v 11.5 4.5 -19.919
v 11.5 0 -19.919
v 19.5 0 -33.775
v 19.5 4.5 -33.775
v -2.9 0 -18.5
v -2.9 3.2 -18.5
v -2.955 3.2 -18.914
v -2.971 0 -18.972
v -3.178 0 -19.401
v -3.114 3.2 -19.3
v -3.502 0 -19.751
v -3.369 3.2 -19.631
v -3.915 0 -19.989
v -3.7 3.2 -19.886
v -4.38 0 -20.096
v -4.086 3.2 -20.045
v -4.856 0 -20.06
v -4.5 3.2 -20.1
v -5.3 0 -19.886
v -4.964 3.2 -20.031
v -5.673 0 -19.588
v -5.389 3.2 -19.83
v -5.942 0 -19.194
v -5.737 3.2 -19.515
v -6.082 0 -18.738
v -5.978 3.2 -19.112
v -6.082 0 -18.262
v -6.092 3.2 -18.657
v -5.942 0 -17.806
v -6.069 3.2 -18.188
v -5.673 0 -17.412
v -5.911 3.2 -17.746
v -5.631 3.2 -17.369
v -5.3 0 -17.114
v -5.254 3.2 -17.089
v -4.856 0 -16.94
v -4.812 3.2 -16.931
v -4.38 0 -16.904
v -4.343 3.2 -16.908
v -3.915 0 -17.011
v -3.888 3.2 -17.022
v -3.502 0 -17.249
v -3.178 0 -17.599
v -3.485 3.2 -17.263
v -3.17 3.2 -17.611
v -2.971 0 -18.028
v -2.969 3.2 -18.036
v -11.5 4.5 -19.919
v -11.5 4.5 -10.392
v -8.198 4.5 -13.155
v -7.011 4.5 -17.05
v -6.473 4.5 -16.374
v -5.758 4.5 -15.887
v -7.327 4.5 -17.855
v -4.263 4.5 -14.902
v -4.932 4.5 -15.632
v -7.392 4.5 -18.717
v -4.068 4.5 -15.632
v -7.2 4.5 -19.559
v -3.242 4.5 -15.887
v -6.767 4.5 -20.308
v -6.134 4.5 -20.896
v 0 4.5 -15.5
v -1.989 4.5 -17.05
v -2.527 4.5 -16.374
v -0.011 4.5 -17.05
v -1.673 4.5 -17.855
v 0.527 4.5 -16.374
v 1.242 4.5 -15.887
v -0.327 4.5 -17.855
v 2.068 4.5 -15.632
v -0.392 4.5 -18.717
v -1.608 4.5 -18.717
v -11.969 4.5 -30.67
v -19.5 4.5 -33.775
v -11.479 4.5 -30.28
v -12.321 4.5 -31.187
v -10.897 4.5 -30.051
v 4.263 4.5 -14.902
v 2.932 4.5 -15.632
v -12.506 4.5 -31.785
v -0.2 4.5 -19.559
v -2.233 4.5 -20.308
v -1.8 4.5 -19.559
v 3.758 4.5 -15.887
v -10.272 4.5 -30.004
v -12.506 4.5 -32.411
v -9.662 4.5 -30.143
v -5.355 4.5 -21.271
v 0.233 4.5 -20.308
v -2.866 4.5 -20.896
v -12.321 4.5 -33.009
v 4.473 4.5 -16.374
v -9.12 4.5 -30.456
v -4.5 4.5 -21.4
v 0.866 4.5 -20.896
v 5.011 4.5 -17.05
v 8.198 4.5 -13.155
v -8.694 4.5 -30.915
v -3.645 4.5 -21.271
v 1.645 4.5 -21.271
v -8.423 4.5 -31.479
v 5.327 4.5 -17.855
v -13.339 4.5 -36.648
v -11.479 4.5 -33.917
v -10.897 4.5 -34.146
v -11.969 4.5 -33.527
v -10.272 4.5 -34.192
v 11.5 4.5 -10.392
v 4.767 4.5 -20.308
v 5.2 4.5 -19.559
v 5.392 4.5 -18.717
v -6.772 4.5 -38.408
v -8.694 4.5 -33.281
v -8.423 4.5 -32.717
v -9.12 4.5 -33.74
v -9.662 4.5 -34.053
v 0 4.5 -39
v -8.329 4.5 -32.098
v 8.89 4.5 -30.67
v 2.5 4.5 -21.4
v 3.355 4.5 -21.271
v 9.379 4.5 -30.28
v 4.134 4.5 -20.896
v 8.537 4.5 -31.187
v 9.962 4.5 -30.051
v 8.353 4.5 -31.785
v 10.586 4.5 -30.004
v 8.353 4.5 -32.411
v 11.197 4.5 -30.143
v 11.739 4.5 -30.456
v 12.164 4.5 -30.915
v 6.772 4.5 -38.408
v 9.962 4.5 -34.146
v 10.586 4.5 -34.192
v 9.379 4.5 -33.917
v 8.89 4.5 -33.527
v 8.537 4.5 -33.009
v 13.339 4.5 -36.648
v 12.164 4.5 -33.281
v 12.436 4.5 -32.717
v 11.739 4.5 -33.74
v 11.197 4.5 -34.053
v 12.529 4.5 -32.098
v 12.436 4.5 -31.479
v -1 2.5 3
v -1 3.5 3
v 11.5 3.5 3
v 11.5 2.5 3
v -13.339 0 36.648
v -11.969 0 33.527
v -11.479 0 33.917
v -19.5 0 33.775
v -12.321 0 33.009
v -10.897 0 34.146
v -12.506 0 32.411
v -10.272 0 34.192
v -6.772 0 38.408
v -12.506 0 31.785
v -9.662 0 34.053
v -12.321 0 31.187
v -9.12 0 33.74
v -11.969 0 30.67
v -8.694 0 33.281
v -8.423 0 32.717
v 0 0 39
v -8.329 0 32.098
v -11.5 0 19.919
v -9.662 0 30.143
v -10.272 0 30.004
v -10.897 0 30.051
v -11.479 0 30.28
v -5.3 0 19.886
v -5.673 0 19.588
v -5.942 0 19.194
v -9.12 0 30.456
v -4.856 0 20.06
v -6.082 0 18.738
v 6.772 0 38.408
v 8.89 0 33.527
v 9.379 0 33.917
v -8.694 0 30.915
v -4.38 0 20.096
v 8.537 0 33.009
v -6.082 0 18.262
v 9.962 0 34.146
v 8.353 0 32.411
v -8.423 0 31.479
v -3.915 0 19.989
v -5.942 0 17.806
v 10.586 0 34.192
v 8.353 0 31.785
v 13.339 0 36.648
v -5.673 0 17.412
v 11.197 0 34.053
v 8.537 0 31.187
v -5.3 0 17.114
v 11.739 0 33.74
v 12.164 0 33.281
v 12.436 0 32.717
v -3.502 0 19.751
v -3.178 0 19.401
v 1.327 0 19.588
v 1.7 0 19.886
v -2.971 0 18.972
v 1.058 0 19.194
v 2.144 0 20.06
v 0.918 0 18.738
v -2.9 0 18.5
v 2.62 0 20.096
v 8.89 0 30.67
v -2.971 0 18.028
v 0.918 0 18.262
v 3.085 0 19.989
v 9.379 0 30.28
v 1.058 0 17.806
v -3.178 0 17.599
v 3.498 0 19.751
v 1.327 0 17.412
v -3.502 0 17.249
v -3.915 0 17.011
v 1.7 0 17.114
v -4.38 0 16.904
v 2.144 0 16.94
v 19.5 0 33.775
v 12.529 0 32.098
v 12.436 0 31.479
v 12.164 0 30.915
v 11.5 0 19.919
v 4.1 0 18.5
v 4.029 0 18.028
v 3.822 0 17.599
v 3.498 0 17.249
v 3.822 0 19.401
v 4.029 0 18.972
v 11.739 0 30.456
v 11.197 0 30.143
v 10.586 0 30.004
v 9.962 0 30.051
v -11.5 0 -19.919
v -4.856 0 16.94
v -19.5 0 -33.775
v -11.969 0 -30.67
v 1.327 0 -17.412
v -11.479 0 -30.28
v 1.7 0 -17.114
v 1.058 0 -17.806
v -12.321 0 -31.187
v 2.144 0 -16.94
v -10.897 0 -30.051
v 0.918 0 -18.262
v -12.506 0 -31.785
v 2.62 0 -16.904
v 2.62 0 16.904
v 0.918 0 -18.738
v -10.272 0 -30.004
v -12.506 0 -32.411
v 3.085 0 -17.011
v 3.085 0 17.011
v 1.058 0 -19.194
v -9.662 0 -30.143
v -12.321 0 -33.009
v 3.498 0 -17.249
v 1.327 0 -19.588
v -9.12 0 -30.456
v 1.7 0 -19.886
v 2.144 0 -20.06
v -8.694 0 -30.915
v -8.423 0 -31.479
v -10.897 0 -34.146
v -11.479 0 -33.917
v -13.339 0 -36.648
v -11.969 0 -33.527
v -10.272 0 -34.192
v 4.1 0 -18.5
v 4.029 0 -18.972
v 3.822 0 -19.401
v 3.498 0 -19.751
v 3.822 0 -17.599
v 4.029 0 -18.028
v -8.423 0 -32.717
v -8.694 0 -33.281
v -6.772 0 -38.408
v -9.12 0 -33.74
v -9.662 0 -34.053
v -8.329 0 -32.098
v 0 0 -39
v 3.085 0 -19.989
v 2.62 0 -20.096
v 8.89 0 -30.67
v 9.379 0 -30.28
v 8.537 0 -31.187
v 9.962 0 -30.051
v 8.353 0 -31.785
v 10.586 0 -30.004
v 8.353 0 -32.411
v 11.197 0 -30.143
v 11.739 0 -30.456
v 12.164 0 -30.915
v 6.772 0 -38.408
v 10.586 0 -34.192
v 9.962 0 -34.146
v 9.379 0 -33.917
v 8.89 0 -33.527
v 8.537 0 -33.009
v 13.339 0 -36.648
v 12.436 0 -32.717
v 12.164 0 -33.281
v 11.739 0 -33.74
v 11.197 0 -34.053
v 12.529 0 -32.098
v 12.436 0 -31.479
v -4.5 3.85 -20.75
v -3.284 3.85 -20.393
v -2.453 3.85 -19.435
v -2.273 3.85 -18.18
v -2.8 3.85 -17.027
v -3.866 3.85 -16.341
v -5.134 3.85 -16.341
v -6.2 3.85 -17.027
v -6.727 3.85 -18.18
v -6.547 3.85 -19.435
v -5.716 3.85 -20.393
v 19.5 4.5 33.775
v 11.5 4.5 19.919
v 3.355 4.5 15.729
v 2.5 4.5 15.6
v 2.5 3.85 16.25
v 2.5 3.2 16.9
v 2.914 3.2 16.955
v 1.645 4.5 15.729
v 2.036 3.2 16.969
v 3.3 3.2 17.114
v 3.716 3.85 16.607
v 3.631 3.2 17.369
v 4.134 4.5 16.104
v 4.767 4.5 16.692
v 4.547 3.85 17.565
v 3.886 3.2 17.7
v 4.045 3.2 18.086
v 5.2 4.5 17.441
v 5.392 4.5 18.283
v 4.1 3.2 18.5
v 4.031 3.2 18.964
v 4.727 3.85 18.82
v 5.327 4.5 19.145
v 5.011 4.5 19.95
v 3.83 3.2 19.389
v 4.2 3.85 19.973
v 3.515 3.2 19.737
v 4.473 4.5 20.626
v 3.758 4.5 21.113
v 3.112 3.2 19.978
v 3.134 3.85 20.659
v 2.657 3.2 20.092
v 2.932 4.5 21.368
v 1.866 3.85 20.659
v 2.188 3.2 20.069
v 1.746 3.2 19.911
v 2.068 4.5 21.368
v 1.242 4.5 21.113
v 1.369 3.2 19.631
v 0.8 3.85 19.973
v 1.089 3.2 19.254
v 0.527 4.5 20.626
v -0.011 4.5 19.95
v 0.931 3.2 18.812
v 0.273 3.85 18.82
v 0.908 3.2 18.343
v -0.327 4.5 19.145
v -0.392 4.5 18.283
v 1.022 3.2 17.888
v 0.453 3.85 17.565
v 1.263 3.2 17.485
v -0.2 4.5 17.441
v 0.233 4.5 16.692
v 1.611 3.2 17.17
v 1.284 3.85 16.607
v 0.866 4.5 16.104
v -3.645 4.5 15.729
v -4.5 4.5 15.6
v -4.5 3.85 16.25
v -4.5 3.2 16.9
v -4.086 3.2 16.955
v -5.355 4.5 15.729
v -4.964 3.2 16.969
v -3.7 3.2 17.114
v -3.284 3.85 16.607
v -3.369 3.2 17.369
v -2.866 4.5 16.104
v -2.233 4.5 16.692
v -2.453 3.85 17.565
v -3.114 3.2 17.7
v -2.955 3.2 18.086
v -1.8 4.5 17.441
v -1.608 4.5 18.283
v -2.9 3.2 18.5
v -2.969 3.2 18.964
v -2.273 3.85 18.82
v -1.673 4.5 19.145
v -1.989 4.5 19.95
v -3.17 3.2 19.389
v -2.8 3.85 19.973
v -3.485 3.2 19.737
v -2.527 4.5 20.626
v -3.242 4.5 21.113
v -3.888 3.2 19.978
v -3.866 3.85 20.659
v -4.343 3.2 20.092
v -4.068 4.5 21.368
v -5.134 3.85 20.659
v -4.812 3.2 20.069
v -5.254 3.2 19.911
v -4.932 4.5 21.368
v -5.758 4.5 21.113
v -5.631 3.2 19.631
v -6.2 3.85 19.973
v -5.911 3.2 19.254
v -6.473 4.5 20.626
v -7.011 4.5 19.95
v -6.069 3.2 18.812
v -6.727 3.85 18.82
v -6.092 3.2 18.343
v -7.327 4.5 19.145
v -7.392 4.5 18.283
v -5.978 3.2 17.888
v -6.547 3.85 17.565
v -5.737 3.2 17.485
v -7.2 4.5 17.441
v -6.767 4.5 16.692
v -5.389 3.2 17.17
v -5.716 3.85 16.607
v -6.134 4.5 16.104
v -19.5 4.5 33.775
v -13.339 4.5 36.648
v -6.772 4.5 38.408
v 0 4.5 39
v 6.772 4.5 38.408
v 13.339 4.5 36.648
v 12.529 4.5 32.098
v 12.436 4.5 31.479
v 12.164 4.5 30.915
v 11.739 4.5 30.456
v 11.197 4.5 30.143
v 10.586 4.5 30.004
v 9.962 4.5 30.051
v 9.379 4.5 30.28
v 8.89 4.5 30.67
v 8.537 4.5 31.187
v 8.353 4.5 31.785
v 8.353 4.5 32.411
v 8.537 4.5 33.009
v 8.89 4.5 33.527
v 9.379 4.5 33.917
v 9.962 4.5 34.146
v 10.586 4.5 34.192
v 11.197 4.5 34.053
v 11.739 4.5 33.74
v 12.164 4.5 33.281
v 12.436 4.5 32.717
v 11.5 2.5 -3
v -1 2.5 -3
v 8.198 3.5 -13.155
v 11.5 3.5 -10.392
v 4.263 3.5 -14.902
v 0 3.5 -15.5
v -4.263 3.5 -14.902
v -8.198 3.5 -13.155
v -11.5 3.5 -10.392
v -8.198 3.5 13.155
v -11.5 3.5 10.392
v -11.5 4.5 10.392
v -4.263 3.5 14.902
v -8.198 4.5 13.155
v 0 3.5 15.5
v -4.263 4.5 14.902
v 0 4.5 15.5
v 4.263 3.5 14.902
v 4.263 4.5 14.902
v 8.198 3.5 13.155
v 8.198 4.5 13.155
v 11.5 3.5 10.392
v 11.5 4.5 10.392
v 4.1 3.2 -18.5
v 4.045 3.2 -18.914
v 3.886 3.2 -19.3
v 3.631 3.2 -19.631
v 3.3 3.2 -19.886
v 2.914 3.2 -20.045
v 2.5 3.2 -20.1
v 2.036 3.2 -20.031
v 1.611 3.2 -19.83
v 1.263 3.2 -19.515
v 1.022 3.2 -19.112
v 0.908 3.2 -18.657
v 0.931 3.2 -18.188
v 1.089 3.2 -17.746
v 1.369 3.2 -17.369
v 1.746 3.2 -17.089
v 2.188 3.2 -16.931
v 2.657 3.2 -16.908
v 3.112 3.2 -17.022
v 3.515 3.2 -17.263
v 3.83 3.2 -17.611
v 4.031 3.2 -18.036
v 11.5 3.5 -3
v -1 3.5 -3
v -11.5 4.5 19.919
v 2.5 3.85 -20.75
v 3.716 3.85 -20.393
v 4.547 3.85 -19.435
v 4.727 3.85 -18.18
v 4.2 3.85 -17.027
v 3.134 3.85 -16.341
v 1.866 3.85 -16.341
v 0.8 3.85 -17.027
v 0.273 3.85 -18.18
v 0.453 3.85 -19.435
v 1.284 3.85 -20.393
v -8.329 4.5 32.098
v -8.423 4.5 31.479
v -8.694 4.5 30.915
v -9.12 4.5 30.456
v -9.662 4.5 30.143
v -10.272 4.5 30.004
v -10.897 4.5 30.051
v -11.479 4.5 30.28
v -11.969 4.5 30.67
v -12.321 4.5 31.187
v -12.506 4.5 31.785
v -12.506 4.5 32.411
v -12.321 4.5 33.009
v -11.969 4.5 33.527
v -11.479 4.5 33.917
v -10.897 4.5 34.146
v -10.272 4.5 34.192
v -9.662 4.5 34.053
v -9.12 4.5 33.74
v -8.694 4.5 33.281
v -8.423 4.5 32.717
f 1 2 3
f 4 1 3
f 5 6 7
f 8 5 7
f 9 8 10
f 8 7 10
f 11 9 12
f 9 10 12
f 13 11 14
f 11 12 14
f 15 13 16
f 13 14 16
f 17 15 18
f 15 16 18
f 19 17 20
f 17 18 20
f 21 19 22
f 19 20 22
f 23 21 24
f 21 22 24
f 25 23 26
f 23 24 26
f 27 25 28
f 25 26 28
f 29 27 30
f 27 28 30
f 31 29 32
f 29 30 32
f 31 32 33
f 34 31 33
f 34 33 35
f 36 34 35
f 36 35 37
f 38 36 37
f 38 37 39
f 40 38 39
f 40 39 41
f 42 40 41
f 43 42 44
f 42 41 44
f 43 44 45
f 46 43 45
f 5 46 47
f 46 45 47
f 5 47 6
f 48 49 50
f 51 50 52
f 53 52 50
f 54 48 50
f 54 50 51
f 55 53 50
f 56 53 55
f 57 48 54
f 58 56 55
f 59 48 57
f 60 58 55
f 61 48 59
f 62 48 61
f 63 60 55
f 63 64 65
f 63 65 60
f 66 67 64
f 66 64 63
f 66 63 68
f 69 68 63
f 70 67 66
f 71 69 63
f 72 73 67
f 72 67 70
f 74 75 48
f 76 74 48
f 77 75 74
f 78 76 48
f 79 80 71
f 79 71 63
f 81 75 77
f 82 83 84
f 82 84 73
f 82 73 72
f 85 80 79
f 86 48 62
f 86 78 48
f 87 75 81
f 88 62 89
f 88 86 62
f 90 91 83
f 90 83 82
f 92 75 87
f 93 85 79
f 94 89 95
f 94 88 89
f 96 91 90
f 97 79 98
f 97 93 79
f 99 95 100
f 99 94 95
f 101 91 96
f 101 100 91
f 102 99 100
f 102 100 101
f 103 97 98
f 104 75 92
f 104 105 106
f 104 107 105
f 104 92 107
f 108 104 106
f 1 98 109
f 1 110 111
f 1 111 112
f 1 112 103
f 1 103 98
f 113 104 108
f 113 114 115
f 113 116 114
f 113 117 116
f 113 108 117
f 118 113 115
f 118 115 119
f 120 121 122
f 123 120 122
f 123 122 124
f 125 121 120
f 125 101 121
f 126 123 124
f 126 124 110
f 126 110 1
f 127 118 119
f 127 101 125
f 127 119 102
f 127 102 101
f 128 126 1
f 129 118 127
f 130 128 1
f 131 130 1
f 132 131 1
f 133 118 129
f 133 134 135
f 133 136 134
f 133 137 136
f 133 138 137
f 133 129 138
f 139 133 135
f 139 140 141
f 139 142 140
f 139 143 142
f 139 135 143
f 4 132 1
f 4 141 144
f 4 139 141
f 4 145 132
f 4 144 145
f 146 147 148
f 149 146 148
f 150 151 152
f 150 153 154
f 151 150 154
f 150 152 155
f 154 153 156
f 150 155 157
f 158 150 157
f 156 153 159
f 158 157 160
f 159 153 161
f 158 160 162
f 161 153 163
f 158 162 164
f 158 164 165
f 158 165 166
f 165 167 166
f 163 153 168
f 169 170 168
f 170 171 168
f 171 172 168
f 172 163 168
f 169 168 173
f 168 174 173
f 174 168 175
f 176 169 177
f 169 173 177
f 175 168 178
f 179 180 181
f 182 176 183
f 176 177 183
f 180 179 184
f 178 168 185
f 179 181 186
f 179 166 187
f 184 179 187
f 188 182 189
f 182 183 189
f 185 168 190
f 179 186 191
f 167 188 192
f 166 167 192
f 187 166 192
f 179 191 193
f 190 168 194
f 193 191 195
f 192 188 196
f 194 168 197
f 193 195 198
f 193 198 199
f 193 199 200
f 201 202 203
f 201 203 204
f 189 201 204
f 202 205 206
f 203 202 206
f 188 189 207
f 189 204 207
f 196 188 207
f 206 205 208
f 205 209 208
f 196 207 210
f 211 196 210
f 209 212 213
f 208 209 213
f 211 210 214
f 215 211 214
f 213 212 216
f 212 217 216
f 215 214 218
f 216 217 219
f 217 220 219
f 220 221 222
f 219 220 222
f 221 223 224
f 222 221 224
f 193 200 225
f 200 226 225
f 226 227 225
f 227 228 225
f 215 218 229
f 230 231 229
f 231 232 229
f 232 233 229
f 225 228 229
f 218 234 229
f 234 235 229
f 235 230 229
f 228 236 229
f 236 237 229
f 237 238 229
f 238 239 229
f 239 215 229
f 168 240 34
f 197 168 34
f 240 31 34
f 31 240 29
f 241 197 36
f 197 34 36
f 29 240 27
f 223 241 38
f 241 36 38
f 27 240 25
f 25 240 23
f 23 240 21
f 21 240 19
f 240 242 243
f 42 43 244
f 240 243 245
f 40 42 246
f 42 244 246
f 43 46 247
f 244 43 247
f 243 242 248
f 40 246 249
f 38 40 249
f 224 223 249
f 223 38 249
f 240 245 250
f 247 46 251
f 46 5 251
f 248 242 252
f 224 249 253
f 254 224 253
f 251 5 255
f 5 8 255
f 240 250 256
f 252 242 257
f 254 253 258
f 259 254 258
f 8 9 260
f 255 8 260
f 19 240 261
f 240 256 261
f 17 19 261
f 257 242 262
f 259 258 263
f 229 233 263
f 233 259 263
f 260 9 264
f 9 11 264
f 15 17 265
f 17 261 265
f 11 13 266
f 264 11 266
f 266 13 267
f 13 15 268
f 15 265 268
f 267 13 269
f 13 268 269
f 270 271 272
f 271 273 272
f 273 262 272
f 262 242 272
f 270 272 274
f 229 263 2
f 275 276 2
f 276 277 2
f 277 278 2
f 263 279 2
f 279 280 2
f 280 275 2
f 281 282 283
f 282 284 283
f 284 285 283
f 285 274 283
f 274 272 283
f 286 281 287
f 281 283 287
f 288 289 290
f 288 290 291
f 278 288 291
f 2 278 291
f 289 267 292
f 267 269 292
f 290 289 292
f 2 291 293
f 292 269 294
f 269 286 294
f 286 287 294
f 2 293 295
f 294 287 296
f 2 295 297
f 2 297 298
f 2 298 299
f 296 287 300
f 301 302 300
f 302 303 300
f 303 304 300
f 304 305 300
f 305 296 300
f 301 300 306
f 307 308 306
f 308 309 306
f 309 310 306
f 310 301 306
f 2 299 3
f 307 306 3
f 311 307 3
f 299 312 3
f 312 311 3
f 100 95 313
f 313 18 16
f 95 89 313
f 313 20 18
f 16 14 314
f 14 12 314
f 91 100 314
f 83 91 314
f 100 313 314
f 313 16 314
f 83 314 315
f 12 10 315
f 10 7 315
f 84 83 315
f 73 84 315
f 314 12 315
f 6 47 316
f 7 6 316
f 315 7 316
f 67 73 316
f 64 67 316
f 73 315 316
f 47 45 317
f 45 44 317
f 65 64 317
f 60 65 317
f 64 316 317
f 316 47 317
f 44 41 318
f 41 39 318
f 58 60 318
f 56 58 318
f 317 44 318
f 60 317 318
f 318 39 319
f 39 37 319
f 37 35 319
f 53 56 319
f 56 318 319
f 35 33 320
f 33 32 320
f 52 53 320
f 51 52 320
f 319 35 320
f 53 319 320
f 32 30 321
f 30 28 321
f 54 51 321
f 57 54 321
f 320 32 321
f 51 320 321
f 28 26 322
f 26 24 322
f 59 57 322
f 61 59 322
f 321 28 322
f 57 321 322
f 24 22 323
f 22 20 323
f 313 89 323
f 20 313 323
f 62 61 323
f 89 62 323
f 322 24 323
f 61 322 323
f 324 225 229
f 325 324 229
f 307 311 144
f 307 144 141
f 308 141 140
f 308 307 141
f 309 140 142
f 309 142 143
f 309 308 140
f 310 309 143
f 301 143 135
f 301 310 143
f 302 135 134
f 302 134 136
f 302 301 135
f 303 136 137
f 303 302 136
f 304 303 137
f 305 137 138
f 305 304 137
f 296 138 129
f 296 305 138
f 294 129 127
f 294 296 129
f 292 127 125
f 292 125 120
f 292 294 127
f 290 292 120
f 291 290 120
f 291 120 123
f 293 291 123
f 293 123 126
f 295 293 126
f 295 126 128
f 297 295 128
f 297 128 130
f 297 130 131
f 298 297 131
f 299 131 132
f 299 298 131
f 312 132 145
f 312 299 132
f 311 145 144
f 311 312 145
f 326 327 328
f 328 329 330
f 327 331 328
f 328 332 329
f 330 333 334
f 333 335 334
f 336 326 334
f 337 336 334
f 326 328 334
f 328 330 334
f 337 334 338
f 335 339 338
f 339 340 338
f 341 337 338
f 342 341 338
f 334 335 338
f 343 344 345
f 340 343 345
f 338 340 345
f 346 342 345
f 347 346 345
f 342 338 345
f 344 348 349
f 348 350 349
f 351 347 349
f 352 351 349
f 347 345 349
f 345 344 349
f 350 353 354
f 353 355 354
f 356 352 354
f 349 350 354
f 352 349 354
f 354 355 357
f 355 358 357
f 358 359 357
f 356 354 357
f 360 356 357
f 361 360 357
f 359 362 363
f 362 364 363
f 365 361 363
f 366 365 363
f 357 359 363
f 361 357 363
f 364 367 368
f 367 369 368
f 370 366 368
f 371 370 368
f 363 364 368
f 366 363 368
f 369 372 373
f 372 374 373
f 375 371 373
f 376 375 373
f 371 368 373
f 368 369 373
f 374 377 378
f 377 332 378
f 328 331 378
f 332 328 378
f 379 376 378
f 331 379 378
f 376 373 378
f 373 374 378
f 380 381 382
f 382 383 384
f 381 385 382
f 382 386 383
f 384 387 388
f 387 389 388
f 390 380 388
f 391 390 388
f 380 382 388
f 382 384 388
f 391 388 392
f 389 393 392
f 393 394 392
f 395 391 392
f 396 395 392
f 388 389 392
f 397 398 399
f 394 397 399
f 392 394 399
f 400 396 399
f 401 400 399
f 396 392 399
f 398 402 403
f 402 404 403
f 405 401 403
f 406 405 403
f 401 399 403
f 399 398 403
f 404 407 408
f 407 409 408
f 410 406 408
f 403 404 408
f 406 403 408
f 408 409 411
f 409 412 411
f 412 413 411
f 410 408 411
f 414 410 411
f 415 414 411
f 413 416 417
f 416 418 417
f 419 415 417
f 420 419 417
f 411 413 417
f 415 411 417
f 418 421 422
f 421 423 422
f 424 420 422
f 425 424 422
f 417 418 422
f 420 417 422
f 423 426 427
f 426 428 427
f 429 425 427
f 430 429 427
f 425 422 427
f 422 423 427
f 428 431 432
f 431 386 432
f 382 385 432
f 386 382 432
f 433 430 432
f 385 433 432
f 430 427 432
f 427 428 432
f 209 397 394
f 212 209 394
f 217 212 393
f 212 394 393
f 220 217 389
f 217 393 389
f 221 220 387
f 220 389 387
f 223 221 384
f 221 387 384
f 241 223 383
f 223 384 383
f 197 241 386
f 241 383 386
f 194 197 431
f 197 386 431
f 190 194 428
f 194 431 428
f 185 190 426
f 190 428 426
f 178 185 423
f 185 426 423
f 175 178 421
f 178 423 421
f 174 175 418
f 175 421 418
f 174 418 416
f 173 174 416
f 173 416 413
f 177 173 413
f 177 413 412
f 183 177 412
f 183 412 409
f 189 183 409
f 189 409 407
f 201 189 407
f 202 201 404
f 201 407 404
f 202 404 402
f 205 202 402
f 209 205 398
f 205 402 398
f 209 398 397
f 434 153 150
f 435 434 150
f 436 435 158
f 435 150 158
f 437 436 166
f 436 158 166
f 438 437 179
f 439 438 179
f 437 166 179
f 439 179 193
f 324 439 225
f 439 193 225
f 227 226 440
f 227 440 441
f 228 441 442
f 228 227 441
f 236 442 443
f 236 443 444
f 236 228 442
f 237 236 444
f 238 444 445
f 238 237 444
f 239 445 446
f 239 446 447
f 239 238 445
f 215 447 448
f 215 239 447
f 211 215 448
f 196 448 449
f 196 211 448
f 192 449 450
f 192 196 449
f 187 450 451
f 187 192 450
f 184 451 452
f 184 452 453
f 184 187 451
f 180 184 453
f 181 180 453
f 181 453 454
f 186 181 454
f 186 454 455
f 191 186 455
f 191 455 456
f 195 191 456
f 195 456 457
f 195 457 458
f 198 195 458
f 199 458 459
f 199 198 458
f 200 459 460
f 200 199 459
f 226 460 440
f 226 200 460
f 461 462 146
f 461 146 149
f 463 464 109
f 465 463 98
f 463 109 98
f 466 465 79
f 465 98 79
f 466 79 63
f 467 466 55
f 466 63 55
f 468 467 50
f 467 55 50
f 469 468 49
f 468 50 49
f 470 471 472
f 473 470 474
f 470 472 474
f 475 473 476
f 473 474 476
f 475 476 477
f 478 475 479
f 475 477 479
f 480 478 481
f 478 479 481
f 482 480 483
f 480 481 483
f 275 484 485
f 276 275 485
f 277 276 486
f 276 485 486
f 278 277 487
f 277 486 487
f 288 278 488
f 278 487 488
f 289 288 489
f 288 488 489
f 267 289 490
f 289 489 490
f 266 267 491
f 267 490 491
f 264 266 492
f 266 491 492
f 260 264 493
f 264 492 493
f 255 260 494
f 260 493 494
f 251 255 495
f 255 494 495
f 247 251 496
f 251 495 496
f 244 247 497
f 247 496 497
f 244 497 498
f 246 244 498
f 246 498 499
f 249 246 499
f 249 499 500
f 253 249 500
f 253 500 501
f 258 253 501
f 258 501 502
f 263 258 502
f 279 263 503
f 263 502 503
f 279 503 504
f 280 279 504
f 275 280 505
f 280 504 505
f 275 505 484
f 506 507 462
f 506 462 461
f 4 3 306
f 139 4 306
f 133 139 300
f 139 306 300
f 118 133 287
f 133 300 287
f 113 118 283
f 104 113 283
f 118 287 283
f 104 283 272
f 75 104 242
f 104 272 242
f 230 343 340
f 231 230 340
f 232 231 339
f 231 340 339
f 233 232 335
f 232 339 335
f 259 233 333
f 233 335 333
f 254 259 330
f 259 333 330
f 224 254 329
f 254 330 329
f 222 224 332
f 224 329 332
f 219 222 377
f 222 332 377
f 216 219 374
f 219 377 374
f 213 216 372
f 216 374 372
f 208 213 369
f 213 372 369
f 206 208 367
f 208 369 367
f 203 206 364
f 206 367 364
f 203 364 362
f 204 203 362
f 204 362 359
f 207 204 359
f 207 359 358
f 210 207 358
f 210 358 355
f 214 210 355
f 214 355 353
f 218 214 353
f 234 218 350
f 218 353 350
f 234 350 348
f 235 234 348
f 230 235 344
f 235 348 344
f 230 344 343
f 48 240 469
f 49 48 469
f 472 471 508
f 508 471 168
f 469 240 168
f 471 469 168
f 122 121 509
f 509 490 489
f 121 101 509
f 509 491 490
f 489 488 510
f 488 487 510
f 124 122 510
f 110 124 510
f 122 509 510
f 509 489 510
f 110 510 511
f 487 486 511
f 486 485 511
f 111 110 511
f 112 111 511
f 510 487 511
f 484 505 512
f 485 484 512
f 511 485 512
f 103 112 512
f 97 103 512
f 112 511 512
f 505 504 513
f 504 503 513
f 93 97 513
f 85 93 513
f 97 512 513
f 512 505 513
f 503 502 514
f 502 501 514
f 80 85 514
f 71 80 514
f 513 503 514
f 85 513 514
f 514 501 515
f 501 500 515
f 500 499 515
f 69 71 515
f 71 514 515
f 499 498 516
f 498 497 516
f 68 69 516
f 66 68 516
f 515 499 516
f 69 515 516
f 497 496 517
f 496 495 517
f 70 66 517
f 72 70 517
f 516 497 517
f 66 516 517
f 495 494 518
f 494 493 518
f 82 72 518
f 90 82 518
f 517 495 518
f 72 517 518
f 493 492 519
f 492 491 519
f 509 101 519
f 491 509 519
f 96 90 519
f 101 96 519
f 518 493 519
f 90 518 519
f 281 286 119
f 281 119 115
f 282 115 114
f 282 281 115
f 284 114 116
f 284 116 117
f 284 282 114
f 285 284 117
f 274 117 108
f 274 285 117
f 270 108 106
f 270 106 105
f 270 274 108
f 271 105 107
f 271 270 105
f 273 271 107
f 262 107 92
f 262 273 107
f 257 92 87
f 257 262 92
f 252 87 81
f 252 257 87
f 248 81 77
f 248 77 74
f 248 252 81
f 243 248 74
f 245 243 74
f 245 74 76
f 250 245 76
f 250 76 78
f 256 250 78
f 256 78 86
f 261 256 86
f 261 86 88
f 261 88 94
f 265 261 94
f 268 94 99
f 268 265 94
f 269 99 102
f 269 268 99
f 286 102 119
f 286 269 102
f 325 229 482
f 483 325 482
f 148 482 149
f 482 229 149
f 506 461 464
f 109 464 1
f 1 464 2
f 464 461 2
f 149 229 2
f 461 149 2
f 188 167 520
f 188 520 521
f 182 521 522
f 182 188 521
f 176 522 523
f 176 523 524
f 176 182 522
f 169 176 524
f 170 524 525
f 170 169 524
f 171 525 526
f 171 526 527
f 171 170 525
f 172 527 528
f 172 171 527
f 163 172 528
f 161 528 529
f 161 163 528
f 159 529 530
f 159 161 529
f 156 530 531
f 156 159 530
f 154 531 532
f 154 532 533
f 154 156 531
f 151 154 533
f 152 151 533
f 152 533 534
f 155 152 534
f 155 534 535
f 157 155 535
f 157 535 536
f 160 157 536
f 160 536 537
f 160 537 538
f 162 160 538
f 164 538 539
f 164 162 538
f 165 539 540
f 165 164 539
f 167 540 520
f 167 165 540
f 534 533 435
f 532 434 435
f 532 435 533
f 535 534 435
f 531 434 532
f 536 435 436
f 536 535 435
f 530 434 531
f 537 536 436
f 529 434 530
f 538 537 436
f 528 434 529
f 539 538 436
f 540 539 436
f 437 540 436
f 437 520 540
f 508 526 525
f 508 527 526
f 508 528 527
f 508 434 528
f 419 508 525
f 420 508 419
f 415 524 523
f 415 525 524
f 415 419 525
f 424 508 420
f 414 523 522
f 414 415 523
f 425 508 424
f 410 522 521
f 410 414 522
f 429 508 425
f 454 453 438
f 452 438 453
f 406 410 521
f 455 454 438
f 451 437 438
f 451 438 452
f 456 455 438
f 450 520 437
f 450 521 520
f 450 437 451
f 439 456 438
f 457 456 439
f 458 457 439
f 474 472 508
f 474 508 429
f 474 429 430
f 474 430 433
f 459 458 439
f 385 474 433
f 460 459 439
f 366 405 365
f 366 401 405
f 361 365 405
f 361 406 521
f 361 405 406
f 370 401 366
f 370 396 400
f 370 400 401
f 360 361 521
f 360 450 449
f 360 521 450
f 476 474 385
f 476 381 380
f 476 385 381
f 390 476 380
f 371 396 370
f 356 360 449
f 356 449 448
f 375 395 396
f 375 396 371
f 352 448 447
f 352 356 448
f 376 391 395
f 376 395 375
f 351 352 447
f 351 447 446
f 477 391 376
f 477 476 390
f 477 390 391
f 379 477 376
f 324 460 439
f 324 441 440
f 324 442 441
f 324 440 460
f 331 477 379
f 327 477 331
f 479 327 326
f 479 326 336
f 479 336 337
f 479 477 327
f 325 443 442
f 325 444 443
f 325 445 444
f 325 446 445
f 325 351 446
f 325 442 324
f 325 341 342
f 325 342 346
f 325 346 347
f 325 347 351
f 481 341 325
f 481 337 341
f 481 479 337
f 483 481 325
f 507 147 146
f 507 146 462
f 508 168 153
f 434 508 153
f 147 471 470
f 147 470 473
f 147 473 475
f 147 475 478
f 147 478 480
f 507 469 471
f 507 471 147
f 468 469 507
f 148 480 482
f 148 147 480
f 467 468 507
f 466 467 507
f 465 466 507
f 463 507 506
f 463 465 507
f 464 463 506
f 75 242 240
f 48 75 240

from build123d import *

# Parameters (mm, degrees)
SKETCH1_R                                           = 2.1
BOSS_EXTRUDE1_DEPTH                                 = 4.5
SKETCH2_R                                           = 15.5
CUT_EXTRUDE1_DEPTH                                  = 1
SKETCH3_W                                           = 12.5
SKETCH3_H                                           = 6
CUT_EXTRUDE2_DEPTH                                  = 1
SKETCH4_R                                           = 1.6
CUT_EXTRUDE3_DEPTH                                  = 5.5
CSK_FOR_M4_COUNTERSUNK_FLAT_HEAD_SCREW1_D           = 3.2
CSK_FOR_M4_COUNTERSUNK_FLAT_HEAD_SCREW1_CSINK_D     = 5.8
CSK_FOR_M4_COUNTERSUNK_FLAT_HEAD_SCREW1_CSINK_ANGLE = 90


with BuildPart() as part:
    # Sketch1 → Boss-Extrude1 (new body)
    with BuildSketch(Plane(origin=(0, 0, 0), x_dir=(1, 0, 0), z_dir=(0, 1, 0))):
        with BuildLine():
            Line((11.5, -19.918584287), (0, 0))
            Line((0, 0), (-11.5, -19.918584287))
            Line((-11.5, -19.918584287), (-19.5, -33.774990748))
            ThreePointArc((-19.5, -33.774990748), (0, -39), (19.5, -33.774990748))
            Line((19.5, -33.774990748), (11.5, -19.918584287))
        make_face()
        with Locations((-10.42932356, -32.098157425)):
            Circle(SKETCH1_R, mode=Mode.SUBTRACT)
        with Locations((10.42932356, -32.098157425)):
            Circle(SKETCH1_R, mode=Mode.SUBTRACT)
        Polygon((11.5, 19.918584287), (0, 0), (11.5, -19.918584287), align=None)
        with BuildLine():
            Line((-11.5, 19.918584287), (0, 0))
            Line((0, 0), (11.5, 19.918584287))
            Line((11.5, 19.918584287), (19.5, 33.774990748))
            ThreePointArc((19.5, 33.774990748), (0, 39), (-19.5, 33.774990748))
            Line((-19.5, 33.774990748), (-11.5, 19.918584287))
        make_face()
        with Locations((-10.42932356, 32.098157425)):
            Circle(SKETCH1_R, mode=Mode.SUBTRACT)
        with Locations((10.42932356, 32.098157425)):
            Circle(SKETCH1_R, mode=Mode.SUBTRACT)
        Polygon((-11.5, -19.918584287), (0, 0), (-11.5, 19.918584287), align=None)
    extrude(amount=BOSS_EXTRUDE1_DEPTH)

    # Sketch2 → Cut-Extrude1 (cut)
    with BuildSketch(Plane(origin=(0, 4.5, 0), x_dir=(1, 0, 0), z_dir=(0, 1, 0))):
        Circle(SKETCH2_R)
    extrude(amount=-CUT_EXTRUDE1_DEPTH, mode=Mode.SUBTRACT)

    # Sketch3 → Cut-Extrude2 (cut)
    with BuildSketch(Plane(origin=(0, 3.5, 0), x_dir=(1, 0, 0), z_dir=(0, 1, 0))):
        with Locations((5.25, 0)):
            Rectangle(SKETCH3_W, SKETCH3_H)
    extrude(amount=-CUT_EXTRUDE2_DEPTH, mode=Mode.SUBTRACT)

    # Sketch4 → Cut-Extrude3 (cut, through all)
    with BuildSketch(Plane(origin=(0, 4.5, 0), x_dir=(1, 0, 0), z_dir=(0, 1, 0))):
        with Locations((-4.5, -18.5)):
            Circle(SKETCH4_R)
        with Locations((2.5, -18.5)):
            Circle(SKETCH4_R)
        with Locations((-4.5, 18.5)):
            Circle(SKETCH4_R)
        with Locations((2.5, 18.5)):
            Circle(SKETCH4_R)
    extrude(amount=-CUT_EXTRUDE3_DEPTH, mode=Mode.SUBTRACT)

    # CSK for M4 Countersunk Flat Head Screw1 (through all)
    with Locations(Plane(origin=(-4.5, 4.5, 18.5), x_dir=(0, 0, 1), z_dir=(0, 1, 0))):
        with Locations((0, 0), (0, 7), (-37, 0), (-37, 7)):
            CounterSinkHole(CSK_FOR_M4_COUNTERSUNK_FLAT_HEAD_SCREW1_D / 2, CSK_FOR_M4_COUNTERSUNK_FLAT_HEAD_SCREW1_CSINK_D / 2, counter_sink_angle=CSK_FOR_M4_COUNTERSUNK_FLAT_HEAD_SCREW1_CSINK_ANGLE)


solid = part.part
